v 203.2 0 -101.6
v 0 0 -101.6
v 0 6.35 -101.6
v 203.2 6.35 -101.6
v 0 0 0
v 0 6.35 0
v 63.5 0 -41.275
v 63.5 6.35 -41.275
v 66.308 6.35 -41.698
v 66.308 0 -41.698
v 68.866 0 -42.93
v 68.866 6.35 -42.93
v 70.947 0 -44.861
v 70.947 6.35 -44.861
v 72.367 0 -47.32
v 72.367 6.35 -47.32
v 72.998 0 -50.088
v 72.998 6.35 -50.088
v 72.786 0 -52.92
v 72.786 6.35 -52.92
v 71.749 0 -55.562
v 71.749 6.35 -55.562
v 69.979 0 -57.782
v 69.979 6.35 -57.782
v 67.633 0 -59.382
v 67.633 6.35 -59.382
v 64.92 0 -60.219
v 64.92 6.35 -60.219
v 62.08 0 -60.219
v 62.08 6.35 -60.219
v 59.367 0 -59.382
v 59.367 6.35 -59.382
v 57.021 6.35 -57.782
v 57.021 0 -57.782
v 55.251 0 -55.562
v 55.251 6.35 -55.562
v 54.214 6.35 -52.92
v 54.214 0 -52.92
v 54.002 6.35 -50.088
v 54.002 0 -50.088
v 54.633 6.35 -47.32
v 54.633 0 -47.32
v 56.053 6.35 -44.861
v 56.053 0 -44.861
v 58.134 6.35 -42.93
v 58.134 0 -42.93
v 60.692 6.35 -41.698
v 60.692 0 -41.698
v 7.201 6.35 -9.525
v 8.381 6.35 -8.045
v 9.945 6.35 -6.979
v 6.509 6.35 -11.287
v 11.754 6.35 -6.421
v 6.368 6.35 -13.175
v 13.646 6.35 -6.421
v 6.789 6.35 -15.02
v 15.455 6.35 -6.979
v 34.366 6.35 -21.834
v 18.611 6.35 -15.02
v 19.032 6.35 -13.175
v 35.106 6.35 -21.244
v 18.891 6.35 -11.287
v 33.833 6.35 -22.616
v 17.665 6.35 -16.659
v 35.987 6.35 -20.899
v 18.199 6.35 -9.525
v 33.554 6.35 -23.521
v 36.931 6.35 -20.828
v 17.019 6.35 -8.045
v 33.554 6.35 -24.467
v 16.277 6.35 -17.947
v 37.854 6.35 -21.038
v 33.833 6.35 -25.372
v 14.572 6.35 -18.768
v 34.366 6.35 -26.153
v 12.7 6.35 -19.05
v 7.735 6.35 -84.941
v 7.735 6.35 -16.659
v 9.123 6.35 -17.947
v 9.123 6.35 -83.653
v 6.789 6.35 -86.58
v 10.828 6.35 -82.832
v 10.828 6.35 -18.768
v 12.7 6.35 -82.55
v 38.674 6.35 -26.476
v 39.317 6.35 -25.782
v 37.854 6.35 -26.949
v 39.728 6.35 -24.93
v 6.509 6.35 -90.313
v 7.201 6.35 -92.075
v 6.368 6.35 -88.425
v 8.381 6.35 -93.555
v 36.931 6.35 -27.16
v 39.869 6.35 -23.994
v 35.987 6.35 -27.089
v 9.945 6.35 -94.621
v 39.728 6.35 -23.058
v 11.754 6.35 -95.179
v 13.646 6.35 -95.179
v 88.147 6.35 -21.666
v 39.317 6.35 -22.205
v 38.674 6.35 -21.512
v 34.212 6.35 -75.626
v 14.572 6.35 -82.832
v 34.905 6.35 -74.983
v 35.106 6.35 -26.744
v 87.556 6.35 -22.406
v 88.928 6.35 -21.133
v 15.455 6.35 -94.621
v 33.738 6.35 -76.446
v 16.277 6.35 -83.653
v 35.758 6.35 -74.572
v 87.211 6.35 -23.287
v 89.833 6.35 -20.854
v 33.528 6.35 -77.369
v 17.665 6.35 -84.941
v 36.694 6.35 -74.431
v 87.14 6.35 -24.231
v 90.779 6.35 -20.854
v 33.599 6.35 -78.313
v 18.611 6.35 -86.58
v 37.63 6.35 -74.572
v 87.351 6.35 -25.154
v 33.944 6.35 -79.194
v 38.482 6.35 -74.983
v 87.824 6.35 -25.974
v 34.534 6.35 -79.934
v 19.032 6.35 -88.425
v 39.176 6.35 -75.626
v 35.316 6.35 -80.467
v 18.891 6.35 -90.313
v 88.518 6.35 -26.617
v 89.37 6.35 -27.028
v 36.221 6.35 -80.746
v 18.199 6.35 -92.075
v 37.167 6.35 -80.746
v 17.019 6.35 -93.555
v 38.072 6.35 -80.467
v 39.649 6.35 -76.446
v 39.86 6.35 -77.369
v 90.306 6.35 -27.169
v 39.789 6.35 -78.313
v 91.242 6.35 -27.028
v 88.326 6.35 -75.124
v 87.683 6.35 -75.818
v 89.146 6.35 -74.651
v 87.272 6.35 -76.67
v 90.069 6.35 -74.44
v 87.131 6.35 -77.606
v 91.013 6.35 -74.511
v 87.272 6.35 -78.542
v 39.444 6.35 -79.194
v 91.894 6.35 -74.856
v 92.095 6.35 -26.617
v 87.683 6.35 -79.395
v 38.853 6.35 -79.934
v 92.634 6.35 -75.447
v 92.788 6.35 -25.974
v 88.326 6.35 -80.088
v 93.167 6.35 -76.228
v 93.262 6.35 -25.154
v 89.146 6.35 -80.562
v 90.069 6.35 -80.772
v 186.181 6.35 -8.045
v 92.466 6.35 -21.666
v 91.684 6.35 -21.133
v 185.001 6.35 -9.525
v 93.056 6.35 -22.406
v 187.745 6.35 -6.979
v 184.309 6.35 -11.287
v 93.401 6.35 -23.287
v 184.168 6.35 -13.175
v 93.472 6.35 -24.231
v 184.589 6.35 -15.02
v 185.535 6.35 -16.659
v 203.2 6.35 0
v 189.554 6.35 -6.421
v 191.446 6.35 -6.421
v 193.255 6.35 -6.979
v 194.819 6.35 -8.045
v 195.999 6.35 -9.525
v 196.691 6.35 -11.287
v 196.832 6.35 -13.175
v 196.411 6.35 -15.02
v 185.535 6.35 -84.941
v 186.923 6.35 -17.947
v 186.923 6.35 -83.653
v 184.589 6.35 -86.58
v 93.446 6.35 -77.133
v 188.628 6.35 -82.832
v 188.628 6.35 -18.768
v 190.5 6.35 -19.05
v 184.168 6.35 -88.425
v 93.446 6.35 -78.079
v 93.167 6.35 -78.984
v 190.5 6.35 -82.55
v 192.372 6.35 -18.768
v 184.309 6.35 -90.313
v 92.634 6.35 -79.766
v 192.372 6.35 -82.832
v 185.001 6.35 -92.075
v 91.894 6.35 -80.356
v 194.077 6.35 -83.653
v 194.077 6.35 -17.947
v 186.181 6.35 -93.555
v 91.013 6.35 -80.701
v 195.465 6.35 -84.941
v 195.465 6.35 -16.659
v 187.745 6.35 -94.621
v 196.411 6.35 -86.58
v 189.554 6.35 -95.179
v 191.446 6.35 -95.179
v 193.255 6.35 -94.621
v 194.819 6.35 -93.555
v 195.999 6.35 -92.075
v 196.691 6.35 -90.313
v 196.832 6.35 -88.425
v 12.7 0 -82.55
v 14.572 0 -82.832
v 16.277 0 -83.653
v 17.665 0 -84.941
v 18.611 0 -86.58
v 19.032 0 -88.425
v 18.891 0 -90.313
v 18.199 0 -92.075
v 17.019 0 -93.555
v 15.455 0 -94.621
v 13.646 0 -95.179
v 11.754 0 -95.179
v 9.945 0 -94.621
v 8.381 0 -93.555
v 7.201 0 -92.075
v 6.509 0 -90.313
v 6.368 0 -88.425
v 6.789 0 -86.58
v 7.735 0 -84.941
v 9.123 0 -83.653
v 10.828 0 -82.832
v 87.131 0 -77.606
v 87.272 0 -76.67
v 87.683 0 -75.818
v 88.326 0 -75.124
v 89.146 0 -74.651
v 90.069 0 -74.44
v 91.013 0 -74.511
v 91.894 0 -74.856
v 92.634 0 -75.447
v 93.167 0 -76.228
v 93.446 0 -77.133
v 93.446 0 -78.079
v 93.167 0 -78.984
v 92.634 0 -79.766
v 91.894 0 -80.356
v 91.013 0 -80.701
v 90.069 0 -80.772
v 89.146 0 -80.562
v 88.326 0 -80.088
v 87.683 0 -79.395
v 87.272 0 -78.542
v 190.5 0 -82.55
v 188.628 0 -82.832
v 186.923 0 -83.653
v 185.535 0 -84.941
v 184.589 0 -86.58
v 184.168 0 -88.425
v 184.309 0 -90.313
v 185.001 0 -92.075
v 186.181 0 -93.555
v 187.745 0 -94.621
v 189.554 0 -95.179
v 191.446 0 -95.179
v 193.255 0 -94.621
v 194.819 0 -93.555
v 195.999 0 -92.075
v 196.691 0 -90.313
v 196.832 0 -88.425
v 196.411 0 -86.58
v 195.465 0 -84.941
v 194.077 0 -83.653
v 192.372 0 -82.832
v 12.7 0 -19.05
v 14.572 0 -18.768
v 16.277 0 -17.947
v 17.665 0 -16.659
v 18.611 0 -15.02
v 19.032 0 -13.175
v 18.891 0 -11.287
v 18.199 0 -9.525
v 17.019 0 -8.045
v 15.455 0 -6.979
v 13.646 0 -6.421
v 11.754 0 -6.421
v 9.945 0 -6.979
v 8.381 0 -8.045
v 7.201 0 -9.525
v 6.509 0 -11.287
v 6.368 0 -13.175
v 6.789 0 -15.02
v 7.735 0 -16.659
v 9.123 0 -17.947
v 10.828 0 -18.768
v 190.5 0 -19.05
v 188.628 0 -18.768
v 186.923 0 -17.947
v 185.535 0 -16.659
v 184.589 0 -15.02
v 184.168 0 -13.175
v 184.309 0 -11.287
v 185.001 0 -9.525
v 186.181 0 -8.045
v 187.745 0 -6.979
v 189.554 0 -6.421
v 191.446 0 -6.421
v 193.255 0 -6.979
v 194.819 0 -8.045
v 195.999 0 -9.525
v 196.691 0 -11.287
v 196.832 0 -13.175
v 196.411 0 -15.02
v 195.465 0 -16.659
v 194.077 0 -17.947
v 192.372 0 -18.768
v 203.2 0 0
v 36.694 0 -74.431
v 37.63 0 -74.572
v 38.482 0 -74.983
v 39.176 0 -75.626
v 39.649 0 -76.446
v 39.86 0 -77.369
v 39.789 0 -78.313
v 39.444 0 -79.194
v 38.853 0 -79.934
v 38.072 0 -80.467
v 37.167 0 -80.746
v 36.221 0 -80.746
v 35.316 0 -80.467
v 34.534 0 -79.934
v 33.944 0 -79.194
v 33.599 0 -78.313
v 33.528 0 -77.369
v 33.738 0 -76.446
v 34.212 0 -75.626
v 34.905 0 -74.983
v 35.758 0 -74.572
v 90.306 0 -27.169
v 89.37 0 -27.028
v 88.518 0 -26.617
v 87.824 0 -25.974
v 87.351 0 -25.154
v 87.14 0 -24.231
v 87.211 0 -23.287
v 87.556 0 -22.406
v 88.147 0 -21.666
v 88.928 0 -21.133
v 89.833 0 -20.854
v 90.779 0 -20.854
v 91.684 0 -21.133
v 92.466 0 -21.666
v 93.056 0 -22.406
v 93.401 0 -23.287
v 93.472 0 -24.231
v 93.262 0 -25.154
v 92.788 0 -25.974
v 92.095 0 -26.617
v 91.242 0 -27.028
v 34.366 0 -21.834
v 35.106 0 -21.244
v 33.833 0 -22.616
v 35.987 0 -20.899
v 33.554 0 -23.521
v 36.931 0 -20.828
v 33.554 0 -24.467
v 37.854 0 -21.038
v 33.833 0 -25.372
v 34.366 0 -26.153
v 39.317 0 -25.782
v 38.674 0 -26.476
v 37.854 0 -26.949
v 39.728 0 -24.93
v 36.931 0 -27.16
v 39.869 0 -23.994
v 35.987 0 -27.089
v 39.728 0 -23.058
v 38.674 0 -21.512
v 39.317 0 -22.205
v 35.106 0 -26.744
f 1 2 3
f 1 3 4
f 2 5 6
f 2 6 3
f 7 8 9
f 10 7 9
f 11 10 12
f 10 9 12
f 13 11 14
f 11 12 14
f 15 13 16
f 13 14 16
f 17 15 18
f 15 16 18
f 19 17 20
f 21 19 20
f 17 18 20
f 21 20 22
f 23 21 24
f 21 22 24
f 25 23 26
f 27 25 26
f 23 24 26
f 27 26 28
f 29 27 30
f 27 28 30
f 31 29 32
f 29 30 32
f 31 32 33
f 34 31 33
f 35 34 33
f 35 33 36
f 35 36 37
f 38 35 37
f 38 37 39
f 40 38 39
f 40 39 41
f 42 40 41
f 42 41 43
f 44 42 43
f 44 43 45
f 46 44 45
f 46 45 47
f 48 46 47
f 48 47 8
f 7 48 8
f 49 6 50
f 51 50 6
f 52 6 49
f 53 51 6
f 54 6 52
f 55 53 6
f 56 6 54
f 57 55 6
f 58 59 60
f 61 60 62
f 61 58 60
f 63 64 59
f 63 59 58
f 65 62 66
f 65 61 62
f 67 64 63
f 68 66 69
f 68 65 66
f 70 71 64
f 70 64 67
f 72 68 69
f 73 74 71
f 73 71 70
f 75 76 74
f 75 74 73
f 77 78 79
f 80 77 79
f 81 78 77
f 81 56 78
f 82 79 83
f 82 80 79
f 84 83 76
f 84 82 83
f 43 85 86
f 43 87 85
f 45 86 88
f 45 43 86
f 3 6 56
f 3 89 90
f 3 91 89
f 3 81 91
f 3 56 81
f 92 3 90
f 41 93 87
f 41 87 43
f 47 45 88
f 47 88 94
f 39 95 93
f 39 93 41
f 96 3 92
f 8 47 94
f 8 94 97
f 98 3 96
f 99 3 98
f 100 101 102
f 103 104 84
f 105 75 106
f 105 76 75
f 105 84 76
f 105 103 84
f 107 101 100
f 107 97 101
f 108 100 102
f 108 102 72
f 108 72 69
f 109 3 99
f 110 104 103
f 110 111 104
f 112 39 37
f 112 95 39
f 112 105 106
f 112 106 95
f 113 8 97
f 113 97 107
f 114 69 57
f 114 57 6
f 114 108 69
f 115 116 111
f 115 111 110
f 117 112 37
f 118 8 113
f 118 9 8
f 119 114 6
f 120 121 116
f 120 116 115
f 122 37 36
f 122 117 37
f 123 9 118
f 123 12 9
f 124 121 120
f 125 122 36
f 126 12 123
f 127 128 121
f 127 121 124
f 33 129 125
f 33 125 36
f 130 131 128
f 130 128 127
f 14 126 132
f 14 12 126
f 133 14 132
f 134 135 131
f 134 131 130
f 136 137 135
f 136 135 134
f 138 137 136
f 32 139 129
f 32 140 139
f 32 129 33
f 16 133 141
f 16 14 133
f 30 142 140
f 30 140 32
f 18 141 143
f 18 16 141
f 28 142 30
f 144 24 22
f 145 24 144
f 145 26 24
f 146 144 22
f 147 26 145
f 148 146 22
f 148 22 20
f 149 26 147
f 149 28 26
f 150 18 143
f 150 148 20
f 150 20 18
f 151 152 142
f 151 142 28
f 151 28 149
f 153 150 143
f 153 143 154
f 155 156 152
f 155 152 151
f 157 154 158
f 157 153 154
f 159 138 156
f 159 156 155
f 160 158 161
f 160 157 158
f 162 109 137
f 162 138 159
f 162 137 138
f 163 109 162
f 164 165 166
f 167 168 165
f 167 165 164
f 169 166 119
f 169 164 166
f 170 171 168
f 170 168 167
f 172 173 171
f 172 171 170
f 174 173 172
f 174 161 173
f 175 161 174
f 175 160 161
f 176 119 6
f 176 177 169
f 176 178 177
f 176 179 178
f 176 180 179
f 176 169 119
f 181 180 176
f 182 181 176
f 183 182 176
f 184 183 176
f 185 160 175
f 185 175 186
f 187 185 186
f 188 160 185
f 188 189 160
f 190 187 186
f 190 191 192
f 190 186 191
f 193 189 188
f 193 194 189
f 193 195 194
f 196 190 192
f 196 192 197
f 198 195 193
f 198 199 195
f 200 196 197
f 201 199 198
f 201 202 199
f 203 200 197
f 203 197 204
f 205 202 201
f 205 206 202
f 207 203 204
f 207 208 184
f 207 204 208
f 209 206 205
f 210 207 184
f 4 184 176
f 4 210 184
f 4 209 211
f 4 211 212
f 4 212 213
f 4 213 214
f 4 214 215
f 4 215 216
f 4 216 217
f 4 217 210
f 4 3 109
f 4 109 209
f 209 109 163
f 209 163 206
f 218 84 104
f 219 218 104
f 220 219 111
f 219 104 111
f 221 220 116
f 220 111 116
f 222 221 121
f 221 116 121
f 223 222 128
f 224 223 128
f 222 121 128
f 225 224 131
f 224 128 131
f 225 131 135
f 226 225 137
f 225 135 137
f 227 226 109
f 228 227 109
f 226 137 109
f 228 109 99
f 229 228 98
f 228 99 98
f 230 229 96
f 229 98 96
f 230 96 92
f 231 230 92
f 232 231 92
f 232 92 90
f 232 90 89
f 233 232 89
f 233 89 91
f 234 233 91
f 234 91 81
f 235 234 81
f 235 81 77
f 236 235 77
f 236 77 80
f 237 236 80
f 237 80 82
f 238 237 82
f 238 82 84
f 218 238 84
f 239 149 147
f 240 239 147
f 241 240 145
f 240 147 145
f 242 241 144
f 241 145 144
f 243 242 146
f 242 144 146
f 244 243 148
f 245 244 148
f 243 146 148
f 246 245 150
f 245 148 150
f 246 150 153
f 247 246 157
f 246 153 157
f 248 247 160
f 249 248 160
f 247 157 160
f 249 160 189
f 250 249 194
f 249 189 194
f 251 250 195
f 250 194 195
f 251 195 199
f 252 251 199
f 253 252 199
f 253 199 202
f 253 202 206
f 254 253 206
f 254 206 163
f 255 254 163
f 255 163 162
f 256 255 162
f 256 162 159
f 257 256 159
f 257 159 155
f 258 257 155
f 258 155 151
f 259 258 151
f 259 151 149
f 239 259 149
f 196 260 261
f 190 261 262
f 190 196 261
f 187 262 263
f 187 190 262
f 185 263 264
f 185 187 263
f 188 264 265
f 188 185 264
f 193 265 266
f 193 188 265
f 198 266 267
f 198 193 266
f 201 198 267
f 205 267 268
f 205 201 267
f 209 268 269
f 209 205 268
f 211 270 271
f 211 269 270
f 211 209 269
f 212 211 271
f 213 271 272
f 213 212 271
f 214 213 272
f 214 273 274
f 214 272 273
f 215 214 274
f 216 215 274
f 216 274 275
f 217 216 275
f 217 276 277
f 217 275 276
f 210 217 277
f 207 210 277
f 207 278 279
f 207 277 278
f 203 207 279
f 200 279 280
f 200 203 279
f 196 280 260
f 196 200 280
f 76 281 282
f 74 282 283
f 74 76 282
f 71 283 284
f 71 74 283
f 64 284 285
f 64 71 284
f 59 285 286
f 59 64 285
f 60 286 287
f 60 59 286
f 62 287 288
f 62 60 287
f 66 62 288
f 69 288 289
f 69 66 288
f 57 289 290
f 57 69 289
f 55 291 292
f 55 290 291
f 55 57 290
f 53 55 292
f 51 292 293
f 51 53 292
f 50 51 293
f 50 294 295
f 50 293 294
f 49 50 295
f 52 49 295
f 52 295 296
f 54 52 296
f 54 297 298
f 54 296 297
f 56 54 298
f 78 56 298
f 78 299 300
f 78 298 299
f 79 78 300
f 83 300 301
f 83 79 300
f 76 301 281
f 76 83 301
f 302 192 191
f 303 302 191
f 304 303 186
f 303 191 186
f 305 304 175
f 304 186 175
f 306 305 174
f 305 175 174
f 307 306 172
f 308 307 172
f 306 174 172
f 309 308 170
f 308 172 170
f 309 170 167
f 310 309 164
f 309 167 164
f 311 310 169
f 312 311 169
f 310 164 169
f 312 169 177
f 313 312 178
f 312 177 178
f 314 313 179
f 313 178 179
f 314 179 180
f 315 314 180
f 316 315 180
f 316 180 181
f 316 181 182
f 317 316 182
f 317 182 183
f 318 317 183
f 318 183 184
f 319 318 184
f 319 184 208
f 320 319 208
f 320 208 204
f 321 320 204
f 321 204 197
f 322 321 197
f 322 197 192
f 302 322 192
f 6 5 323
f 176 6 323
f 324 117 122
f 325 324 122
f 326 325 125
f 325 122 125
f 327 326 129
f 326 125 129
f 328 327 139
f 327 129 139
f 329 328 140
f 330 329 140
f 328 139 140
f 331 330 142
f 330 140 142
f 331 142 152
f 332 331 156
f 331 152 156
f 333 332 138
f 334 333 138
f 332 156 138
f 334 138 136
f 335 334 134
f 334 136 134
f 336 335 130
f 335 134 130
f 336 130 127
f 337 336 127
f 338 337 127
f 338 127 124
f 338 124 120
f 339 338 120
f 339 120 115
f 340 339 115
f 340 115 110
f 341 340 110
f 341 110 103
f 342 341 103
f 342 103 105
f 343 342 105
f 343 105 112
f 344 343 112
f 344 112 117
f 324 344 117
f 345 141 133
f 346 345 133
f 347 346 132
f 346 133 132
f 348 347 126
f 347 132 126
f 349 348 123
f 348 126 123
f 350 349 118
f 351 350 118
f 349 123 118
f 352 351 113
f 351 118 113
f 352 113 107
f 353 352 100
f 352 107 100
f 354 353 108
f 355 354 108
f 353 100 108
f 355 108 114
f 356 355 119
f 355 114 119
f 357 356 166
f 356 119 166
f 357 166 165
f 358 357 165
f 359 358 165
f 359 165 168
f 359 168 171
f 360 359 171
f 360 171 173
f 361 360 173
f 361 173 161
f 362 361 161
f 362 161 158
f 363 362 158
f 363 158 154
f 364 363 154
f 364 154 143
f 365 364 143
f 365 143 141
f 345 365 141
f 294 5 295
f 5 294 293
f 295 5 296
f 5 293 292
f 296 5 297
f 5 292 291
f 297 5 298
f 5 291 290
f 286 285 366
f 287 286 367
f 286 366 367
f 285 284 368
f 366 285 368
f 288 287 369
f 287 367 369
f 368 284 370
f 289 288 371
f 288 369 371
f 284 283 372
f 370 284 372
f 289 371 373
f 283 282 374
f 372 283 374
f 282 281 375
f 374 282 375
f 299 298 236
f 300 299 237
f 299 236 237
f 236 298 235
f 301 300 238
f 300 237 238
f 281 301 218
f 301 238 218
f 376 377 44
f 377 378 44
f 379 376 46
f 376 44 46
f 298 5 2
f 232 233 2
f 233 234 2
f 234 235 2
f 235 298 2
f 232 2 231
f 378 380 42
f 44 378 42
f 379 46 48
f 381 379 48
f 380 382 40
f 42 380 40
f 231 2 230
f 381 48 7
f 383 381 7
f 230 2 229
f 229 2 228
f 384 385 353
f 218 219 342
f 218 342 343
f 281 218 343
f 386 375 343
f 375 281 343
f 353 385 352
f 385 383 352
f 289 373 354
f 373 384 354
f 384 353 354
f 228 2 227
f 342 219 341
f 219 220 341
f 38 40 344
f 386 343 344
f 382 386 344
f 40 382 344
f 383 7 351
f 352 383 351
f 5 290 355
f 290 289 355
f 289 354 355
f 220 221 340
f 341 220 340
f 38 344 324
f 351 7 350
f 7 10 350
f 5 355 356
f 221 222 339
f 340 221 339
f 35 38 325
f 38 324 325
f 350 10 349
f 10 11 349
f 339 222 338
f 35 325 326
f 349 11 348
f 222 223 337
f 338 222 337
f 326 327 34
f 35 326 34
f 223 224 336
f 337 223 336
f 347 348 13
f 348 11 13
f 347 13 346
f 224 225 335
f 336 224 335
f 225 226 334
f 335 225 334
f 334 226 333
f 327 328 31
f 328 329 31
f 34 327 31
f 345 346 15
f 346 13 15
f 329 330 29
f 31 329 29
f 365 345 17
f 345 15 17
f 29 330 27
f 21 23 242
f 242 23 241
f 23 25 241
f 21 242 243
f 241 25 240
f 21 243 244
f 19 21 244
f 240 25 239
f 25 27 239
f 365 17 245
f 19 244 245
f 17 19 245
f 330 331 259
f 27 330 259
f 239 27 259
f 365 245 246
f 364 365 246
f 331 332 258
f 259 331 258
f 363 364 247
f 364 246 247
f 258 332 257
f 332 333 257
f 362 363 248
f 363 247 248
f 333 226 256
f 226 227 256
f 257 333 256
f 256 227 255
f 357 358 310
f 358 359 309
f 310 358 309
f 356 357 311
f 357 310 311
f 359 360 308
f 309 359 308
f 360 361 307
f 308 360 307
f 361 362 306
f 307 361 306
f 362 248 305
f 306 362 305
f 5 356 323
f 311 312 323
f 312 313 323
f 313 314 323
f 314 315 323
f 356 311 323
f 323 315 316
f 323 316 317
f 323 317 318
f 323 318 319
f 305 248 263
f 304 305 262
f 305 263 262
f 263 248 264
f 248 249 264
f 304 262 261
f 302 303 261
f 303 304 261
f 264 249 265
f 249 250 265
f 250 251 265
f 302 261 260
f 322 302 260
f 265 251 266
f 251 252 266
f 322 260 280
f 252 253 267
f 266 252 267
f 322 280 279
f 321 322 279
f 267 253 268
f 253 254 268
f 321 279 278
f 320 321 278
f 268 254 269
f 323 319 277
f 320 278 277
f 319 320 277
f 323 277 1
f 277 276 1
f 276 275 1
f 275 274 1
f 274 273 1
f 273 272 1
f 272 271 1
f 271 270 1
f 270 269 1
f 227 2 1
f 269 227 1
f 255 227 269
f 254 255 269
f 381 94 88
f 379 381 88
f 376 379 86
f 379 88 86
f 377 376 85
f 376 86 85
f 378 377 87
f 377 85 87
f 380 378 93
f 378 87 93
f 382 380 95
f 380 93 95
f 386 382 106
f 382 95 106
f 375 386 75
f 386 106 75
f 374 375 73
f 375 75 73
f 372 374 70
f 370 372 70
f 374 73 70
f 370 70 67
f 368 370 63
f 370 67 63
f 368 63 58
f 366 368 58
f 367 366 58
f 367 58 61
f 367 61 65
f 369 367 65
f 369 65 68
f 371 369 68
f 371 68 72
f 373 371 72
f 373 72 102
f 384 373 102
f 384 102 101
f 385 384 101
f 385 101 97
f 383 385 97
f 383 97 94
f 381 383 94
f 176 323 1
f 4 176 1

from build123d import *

# Parameters (mm, degrees)
SKETCH1_W               = 203.2
SKETCH1_H               = 101.6
BOSS_EXTRUDE1_DEPTH     = 6.35
SKETCH2_R               = 9.525
CUT_EXTRUDE1_DEPTH      = 228.273233136
SKETCH3_R               = 6.35
CUT_EXTRUDE2_DEPTH      = 228.273233136
MIRROR2_COPY_1_SKETCH_R = 6.35
MIRROR2_COPY_1_DEPTH    = 228.273233136
SKETCH4_R               = 3.175
CUT_EXTRUDE3_DEPTH      = 228.273233136
CIRPATTERN1_COUNT       = 4


with BuildPart() as part:
    # Sketch1 → Boss-Extrude1 (new body)
    with BuildSketch(Plane(origin=(0, 0, 0), x_dir=(1, 0, 0), z_dir=(0, 1, 0))):
        with Locations((101.6, 50.8)):
            Rectangle(SKETCH1_W, SKETCH1_H)
    extrude(amount=BOSS_EXTRUDE1_DEPTH)

    # Sketch2 → Cut-Extrude1 (cut, through all)
    with BuildSketch(Plane(origin=(0, 6.35, 0), x_dir=(1, 0, 0), z_dir=(0, 1, 0))):
        with Locations(Location((63.5, 50.8, 0), (0, 0, 270))):
            Circle(SKETCH2_R)
    extrude(amount=-CUT_EXTRUDE1_DEPTH, mode=Mode.SUBTRACT)

    # Sketch3 → Cut-Extrude2 (cut, through all)
    with BuildSketch(Plane(origin=(0, 6.35, 0), x_dir=(1, 0, 0), z_dir=(0, 1, 0))):
        with Locations(Location((12.7, 88.9, 0), (0, 0, 270))):
            Circle(SKETCH3_R)
    cut_extrude2 = extrude(amount=-CUT_EXTRUDE2_DEPTH, mode=Mode.SUBTRACT)

    # Mirror1: Cut-Extrude2 across plane
    add(cut_extrude2.mirror(Plane.XY.offset(-50.8)), mode=Mode.SUBTRACT)

    # Mirror2: Cut-Extrude2 across plane
    add(cut_extrude2.mirror(Plane.ZY.offset(-101.6)), mode=Mode.SUBTRACT)

    # Mirror2 copy 1 sketch → Mirror2 copy 1 (cut, through all)
    with BuildSketch(Plane(origin=(203.2, 6.35, -101.6), x_dir=(-1, 0, 0), z_dir=(0, 1, 0))):
        with Locations(Location((12.7, 88.9, 0), (0, 0, 270))):
            Circle(MIRROR2_COPY_1_SKETCH_R)
    extrude(amount=-MIRROR2_COPY_1_DEPTH, mode=Mode.SUBTRACT)

    # Sketch4 → Cut-Extrude3 (cut, through all)
    with BuildSketch(Plane(origin=(0, 6.35, 0), x_dir=(1, 0, 0), z_dir=(0, 1, 0))):
        with Locations(Location((36.693935479, 77.606064521, 0), (0, 0, 270))):
            Circle(SKETCH4_R)
    cut_extrude3 = extrude(amount=-CUT_EXTRUDE3_DEPTH, mode=Mode.SUBTRACT)

    # CirPattern1: Cut-Extrude3 ×4 about axis
    cirpattern1_axis = Axis((63.5, 0, -50.8), (0, 1, 0))
    for i in range(1, CIRPATTERN1_COUNT):
        add(cut_extrude3.rotate(cirpattern1_axis, i * 360 / CIRPATTERN1_COUNT), mode=Mode.SUBTRACT)


solid = part.part
